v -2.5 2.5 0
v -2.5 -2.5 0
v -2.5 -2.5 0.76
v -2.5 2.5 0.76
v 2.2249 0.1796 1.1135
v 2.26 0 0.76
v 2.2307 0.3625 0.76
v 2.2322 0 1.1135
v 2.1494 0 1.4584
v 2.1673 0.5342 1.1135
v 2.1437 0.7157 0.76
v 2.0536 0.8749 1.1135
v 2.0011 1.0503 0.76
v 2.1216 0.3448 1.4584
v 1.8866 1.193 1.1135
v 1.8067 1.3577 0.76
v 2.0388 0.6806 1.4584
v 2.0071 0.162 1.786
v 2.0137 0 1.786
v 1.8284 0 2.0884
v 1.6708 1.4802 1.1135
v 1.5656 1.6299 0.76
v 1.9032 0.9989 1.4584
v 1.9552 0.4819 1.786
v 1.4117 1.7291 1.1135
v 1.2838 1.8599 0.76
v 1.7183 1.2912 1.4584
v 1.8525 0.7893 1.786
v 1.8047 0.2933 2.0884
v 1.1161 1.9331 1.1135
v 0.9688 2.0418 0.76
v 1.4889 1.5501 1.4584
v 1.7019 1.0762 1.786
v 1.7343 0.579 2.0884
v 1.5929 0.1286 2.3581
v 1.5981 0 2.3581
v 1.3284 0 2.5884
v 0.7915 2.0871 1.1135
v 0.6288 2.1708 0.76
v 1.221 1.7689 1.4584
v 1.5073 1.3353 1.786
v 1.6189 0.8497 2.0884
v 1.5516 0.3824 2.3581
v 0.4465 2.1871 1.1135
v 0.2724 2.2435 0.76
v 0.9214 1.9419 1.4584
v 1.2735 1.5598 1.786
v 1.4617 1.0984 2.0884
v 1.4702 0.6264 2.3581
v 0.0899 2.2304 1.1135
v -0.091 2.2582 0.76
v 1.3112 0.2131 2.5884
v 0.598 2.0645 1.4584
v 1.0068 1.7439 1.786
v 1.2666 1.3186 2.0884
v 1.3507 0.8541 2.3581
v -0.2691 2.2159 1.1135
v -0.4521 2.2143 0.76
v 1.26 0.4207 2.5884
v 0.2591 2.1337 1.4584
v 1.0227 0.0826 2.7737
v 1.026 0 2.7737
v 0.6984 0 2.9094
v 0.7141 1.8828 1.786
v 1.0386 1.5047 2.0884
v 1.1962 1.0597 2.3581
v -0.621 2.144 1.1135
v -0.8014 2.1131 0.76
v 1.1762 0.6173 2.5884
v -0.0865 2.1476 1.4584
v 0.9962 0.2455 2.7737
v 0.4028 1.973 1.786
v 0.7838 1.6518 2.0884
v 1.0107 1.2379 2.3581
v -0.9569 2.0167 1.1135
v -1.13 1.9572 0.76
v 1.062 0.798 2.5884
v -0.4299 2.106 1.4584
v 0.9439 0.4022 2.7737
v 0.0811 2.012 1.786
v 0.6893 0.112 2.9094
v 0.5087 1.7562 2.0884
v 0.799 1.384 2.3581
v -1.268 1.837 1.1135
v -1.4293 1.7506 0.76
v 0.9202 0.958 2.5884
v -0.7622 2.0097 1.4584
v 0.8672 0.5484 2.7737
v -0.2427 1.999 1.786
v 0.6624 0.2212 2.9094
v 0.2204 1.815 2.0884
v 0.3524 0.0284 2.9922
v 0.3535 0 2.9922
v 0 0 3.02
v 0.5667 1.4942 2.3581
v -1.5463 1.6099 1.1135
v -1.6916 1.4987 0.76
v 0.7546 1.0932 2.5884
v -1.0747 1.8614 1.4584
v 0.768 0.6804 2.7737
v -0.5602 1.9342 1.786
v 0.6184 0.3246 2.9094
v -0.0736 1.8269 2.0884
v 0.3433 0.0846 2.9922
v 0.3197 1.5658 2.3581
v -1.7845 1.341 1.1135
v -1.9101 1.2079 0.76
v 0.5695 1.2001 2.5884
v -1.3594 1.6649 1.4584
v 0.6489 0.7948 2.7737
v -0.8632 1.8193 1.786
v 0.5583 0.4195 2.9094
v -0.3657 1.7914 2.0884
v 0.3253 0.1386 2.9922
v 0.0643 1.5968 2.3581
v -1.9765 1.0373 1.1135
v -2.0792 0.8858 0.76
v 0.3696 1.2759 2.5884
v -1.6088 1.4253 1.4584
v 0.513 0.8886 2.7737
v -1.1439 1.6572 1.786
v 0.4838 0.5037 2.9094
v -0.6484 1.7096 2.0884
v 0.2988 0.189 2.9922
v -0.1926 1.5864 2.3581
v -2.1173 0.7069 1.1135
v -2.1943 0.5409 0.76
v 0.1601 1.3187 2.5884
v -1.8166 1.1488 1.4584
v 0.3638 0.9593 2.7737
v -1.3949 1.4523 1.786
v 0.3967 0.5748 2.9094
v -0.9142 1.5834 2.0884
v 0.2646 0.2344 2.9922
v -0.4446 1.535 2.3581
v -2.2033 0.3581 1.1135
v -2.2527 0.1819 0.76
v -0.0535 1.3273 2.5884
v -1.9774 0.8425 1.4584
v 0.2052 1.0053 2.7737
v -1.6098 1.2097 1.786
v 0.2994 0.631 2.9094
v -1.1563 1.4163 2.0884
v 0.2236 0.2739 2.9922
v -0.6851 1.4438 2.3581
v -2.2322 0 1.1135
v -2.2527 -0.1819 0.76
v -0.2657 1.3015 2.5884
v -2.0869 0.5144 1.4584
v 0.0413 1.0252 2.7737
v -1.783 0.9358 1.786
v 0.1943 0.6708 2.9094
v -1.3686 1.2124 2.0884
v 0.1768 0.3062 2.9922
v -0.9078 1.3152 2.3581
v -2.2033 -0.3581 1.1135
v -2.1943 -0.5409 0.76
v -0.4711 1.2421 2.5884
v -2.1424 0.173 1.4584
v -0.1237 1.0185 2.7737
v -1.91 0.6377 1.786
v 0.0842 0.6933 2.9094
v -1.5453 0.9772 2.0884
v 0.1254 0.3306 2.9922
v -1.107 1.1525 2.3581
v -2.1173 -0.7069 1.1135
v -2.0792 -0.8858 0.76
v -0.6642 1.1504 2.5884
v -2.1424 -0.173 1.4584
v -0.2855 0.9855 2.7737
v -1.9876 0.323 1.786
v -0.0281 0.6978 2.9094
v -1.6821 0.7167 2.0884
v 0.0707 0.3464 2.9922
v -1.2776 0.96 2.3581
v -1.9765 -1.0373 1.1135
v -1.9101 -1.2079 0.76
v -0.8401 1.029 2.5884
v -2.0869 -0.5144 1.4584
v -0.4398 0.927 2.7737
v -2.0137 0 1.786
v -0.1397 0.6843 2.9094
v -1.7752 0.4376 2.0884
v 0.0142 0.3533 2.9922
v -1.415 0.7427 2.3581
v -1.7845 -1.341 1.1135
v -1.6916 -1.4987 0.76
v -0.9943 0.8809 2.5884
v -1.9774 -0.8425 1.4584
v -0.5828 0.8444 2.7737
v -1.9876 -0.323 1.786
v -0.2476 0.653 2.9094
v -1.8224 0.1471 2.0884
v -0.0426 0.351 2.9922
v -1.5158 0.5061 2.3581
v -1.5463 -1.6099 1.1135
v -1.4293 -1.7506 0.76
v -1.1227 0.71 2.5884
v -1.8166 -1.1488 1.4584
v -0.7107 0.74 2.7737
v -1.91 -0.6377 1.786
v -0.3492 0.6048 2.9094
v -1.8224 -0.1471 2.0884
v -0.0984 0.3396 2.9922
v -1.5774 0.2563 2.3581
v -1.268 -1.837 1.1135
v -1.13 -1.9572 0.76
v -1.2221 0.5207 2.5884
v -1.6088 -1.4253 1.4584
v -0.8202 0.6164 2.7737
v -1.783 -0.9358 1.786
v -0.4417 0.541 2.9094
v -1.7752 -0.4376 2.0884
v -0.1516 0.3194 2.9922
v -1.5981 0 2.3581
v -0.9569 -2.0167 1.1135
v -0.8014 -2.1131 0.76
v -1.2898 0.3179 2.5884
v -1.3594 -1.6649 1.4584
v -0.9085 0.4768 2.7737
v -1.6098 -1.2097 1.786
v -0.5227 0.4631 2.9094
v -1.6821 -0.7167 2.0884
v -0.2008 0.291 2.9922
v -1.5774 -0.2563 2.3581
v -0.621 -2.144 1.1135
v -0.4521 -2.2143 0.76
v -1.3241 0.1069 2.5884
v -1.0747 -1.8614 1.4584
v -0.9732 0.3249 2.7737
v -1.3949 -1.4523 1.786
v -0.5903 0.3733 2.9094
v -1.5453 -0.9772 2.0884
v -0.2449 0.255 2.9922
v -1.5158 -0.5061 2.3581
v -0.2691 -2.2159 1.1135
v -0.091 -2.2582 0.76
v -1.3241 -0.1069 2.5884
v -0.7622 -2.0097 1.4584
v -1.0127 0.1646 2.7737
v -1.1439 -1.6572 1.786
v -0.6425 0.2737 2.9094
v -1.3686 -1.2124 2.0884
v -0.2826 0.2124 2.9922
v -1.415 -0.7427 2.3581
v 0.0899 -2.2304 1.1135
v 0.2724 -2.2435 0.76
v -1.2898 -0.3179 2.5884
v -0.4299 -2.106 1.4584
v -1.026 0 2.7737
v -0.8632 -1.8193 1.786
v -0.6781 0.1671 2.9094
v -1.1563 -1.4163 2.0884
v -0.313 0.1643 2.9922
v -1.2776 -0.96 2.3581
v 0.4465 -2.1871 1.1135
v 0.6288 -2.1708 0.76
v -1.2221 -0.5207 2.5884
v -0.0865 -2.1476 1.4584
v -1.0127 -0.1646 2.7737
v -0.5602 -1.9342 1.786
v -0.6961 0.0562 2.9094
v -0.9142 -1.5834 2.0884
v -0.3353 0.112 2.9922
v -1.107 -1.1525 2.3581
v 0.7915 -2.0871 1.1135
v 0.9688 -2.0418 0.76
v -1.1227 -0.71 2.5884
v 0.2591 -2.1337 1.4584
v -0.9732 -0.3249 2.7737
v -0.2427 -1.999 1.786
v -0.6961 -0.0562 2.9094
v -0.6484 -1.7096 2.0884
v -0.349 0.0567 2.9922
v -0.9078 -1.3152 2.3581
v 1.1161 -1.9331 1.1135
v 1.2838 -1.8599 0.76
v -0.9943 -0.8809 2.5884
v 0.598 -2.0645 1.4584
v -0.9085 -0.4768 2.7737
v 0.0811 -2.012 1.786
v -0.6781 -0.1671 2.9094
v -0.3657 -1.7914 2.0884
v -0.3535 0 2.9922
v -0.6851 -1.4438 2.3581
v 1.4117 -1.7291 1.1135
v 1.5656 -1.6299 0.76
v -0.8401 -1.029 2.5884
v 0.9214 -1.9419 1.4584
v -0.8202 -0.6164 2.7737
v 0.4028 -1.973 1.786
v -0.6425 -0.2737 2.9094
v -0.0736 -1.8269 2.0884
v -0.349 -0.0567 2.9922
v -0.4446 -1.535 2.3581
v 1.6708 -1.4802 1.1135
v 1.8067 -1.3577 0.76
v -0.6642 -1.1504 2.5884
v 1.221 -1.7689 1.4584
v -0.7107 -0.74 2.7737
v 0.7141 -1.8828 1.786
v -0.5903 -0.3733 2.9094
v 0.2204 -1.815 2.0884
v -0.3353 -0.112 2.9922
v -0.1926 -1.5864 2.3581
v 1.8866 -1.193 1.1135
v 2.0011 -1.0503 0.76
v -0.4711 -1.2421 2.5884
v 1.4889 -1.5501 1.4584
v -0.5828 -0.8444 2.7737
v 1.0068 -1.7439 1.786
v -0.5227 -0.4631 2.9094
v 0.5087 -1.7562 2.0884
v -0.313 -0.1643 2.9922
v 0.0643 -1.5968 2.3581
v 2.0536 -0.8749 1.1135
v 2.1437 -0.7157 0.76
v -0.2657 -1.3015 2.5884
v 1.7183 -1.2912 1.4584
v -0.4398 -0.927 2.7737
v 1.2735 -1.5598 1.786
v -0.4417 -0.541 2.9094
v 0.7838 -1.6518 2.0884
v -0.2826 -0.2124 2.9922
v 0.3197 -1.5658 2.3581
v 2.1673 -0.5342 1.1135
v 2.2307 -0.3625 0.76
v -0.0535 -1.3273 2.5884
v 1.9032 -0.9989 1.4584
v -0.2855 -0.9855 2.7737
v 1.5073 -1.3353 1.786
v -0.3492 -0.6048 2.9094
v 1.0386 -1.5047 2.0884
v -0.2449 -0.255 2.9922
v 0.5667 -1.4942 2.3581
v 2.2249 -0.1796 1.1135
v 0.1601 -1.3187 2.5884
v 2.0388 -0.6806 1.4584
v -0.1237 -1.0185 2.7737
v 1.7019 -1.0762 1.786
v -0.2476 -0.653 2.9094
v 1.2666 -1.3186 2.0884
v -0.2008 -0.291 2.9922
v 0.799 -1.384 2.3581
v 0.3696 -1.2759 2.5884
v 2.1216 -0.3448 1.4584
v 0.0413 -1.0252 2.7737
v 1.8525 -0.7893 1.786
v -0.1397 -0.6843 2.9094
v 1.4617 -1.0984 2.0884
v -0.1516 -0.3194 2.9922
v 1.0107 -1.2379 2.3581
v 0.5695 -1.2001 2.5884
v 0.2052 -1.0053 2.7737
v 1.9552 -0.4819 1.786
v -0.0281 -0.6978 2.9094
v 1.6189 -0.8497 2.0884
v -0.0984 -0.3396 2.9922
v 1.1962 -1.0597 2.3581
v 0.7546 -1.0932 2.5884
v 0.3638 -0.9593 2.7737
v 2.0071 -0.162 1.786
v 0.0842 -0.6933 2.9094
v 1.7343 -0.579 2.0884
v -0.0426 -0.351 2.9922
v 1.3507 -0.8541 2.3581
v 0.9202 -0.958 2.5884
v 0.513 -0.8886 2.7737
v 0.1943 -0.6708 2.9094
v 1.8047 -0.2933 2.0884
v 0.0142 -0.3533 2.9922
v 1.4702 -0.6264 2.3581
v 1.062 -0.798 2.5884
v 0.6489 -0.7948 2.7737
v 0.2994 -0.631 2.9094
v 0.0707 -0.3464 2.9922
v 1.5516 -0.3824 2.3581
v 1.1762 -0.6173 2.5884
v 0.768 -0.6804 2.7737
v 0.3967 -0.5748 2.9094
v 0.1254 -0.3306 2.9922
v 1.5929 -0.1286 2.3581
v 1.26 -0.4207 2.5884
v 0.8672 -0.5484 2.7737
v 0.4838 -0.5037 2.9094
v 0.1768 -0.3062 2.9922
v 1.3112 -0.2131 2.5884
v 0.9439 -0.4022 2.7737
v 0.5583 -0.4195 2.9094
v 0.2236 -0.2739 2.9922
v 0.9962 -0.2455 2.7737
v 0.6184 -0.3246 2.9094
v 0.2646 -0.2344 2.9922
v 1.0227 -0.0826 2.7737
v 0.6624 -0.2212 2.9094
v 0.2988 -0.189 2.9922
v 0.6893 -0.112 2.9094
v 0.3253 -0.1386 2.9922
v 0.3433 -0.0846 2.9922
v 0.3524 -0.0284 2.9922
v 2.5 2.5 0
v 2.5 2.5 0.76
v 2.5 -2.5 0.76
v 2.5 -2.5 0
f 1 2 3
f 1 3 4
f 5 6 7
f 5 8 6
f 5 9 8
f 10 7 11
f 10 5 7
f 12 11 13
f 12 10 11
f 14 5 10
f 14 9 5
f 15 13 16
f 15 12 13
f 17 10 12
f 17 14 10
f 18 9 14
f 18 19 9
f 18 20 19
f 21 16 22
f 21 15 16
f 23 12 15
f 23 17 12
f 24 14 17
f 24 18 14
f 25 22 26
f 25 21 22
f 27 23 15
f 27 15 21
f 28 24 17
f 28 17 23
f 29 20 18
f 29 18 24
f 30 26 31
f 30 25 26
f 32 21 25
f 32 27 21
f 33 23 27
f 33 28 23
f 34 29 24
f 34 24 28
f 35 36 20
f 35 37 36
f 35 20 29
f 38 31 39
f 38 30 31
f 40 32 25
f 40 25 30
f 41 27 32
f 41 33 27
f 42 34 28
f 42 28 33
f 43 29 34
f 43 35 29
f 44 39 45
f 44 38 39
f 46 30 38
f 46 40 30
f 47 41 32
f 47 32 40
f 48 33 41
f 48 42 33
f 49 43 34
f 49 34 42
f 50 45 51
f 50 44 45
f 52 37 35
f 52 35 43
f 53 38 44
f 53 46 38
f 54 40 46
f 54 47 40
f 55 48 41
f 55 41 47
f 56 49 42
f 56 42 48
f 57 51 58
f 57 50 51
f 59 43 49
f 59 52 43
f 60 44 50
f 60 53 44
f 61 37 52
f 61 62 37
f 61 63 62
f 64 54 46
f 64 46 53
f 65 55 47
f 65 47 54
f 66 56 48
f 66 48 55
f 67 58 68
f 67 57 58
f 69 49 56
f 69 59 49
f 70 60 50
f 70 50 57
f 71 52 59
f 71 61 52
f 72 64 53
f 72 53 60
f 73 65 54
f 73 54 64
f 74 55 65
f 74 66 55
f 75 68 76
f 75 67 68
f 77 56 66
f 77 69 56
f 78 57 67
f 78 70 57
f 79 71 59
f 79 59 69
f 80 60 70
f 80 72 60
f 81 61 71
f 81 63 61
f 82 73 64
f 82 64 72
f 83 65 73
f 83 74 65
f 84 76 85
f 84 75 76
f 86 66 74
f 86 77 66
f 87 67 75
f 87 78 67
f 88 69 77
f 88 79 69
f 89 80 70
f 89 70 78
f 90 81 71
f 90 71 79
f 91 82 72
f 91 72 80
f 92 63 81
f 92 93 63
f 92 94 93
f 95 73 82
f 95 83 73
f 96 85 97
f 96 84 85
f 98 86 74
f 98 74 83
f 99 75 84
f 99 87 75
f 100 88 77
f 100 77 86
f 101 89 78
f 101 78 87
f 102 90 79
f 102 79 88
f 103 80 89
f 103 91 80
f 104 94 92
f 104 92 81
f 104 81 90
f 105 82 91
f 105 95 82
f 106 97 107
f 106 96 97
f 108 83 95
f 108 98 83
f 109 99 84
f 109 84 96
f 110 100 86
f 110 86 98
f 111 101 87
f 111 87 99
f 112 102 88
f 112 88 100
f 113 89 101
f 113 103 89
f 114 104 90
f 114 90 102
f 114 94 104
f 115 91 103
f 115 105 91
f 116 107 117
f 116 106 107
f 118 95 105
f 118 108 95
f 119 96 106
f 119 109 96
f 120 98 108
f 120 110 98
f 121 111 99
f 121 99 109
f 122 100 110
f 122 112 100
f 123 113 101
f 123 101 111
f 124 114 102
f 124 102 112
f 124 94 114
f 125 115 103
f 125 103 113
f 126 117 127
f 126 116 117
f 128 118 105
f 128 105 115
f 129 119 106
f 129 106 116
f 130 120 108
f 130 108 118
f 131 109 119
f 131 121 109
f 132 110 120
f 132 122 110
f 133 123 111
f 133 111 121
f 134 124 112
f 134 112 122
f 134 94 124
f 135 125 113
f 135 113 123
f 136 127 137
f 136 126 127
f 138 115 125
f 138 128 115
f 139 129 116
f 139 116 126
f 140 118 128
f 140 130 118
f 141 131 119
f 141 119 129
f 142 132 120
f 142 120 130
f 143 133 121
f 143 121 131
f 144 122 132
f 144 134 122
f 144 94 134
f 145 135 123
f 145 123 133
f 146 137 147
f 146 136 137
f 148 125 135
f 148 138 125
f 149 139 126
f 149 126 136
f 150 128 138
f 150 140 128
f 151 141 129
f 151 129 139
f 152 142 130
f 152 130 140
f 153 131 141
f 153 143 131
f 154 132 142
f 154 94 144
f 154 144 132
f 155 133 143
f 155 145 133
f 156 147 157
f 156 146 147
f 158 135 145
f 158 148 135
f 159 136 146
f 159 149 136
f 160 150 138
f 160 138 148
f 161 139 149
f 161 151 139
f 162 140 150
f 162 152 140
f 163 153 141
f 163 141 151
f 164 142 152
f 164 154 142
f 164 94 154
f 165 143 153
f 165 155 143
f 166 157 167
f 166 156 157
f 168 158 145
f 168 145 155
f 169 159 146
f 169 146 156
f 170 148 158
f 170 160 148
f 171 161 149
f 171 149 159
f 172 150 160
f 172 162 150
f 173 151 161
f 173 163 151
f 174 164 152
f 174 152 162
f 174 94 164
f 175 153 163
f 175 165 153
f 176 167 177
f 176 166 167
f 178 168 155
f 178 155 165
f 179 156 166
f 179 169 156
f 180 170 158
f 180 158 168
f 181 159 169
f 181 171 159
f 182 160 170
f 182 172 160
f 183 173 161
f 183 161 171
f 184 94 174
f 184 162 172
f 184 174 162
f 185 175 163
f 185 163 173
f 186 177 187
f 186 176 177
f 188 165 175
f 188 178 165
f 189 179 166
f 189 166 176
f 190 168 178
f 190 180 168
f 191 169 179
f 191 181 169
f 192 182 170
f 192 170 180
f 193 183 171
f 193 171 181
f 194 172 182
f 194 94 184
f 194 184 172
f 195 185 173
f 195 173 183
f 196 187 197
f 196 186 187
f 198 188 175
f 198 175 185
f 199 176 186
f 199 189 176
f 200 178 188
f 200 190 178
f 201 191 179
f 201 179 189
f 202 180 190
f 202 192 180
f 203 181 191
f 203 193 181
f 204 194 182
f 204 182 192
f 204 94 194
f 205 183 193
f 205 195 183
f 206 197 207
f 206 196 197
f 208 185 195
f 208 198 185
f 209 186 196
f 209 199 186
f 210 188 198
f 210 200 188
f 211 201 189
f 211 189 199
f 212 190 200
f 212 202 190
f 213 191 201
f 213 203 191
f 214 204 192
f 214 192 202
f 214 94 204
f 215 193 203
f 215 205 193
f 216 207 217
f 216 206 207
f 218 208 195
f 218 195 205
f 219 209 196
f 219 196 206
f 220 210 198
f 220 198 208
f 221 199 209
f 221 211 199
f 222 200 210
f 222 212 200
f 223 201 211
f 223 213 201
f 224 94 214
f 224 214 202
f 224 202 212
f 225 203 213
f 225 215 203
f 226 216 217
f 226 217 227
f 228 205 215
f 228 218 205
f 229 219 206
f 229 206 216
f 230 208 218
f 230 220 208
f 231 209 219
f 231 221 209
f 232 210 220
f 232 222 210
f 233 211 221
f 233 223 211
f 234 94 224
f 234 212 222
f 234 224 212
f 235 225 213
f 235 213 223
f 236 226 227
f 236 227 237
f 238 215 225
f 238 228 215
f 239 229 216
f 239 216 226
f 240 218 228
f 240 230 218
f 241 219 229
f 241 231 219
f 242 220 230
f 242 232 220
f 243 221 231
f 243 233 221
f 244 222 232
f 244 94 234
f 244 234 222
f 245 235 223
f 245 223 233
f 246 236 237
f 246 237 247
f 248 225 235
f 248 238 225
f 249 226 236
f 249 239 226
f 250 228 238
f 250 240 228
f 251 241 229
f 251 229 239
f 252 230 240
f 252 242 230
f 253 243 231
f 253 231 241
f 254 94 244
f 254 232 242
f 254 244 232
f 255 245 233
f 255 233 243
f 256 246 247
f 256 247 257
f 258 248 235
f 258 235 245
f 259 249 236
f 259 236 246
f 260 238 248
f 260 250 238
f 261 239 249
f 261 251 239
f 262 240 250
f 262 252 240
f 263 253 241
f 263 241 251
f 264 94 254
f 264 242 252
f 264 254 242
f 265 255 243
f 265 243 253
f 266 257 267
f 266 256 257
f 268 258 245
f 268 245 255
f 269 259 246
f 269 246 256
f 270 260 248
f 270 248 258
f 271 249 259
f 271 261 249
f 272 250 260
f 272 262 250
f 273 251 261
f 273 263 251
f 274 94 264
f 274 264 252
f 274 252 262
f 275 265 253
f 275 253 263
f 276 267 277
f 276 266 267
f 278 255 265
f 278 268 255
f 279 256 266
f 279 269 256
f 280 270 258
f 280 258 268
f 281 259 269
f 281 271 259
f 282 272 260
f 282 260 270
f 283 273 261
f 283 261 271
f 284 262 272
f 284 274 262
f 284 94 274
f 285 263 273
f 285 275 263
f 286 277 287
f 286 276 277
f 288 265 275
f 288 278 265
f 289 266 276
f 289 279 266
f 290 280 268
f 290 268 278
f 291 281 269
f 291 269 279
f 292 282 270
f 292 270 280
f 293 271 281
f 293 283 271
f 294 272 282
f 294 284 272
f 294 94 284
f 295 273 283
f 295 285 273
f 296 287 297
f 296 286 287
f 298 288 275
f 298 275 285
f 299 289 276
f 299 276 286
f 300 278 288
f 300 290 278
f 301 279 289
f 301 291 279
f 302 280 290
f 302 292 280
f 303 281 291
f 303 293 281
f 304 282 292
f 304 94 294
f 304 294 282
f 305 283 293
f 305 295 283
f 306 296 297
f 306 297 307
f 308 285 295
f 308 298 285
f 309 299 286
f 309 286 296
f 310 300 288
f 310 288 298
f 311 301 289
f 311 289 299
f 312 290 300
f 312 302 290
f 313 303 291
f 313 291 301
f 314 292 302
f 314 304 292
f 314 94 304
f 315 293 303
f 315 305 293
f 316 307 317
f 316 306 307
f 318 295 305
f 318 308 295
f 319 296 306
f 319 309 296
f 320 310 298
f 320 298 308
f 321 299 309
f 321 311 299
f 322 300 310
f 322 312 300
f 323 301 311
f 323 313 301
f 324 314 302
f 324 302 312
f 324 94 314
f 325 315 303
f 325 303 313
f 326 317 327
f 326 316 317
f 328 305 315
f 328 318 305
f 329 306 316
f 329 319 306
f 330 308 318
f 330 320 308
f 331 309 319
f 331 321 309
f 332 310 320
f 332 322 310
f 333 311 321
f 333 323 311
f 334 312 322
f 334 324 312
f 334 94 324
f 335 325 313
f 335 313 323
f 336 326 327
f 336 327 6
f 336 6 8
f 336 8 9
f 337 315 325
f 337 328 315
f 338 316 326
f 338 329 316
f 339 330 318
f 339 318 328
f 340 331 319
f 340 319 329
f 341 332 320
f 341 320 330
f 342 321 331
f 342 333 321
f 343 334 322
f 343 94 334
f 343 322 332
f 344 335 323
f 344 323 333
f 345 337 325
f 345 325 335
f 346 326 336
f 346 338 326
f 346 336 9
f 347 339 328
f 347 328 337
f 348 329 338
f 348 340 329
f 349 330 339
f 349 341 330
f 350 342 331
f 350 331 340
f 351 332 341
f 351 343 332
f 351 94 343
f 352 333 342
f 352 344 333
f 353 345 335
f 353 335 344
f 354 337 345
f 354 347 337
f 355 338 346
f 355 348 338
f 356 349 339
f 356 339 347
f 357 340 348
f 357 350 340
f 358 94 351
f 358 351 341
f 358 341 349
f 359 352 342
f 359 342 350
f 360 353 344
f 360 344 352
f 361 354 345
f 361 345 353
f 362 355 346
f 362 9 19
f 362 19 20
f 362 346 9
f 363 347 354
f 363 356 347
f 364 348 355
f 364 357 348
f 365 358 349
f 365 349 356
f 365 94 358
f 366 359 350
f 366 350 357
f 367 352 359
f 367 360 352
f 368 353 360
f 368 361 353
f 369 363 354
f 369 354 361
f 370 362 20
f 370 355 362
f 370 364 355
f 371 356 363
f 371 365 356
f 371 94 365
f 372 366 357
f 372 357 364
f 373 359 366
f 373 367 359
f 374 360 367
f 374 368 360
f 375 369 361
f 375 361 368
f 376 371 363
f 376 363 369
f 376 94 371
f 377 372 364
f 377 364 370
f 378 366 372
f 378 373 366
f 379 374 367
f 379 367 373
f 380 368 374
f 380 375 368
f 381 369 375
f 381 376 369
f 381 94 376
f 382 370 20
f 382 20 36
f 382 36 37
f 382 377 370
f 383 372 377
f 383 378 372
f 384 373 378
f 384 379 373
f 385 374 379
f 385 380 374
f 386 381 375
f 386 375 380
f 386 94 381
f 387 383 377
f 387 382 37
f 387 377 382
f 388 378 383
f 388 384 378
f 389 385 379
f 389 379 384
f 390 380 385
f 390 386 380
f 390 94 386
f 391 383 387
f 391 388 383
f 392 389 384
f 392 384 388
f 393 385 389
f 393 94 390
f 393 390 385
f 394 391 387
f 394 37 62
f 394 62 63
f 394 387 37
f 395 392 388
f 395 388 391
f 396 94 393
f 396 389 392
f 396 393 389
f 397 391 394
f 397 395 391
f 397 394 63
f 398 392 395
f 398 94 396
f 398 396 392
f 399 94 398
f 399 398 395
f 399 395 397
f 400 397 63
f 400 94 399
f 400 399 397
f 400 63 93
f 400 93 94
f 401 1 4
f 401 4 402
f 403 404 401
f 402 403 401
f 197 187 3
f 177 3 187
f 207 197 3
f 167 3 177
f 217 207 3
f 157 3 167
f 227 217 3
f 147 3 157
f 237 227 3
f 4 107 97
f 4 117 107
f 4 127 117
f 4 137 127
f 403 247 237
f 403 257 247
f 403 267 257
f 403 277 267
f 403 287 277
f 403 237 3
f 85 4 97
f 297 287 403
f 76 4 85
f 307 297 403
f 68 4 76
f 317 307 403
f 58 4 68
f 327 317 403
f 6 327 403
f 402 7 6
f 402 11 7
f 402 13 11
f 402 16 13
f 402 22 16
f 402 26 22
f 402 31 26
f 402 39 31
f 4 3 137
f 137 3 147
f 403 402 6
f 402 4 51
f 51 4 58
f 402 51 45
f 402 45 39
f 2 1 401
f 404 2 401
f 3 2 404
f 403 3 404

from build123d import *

# Parameters (mm, degrees)
SKETCH1_W           = 5
SKETCH1_H           = 5
BOSS_EXTRUDE1_DEPTH = 0.76


with BuildPart() as part:
    # Sketch1 → Boss-Extrude1 (new body)
    with BuildSketch(Plane.XY):
        Rectangle(SKETCH1_W, SKETCH1_H)
    extrude(amount=BOSS_EXTRUDE1_DEPTH)

    # Sketch2 → Revolve1 (revolve)
    with BuildSketch(Plane(origin=(0, 0, 0), x_dir=(1, 0, 0), z_dir=(0, 1, 0))):
        with BuildLine():
            Line((0, -0.76), (2.26, -0.76))
            ThreePointArc((2.26, -0.76), (1.598061325, -2.358061325), (0, -3.02))
            Line((0, -3.02), (0, -0.76))
        make_face()
    revolve(axis=Axis((0, 0, 0.76), (0, 0, 1)))


solid = part.part
